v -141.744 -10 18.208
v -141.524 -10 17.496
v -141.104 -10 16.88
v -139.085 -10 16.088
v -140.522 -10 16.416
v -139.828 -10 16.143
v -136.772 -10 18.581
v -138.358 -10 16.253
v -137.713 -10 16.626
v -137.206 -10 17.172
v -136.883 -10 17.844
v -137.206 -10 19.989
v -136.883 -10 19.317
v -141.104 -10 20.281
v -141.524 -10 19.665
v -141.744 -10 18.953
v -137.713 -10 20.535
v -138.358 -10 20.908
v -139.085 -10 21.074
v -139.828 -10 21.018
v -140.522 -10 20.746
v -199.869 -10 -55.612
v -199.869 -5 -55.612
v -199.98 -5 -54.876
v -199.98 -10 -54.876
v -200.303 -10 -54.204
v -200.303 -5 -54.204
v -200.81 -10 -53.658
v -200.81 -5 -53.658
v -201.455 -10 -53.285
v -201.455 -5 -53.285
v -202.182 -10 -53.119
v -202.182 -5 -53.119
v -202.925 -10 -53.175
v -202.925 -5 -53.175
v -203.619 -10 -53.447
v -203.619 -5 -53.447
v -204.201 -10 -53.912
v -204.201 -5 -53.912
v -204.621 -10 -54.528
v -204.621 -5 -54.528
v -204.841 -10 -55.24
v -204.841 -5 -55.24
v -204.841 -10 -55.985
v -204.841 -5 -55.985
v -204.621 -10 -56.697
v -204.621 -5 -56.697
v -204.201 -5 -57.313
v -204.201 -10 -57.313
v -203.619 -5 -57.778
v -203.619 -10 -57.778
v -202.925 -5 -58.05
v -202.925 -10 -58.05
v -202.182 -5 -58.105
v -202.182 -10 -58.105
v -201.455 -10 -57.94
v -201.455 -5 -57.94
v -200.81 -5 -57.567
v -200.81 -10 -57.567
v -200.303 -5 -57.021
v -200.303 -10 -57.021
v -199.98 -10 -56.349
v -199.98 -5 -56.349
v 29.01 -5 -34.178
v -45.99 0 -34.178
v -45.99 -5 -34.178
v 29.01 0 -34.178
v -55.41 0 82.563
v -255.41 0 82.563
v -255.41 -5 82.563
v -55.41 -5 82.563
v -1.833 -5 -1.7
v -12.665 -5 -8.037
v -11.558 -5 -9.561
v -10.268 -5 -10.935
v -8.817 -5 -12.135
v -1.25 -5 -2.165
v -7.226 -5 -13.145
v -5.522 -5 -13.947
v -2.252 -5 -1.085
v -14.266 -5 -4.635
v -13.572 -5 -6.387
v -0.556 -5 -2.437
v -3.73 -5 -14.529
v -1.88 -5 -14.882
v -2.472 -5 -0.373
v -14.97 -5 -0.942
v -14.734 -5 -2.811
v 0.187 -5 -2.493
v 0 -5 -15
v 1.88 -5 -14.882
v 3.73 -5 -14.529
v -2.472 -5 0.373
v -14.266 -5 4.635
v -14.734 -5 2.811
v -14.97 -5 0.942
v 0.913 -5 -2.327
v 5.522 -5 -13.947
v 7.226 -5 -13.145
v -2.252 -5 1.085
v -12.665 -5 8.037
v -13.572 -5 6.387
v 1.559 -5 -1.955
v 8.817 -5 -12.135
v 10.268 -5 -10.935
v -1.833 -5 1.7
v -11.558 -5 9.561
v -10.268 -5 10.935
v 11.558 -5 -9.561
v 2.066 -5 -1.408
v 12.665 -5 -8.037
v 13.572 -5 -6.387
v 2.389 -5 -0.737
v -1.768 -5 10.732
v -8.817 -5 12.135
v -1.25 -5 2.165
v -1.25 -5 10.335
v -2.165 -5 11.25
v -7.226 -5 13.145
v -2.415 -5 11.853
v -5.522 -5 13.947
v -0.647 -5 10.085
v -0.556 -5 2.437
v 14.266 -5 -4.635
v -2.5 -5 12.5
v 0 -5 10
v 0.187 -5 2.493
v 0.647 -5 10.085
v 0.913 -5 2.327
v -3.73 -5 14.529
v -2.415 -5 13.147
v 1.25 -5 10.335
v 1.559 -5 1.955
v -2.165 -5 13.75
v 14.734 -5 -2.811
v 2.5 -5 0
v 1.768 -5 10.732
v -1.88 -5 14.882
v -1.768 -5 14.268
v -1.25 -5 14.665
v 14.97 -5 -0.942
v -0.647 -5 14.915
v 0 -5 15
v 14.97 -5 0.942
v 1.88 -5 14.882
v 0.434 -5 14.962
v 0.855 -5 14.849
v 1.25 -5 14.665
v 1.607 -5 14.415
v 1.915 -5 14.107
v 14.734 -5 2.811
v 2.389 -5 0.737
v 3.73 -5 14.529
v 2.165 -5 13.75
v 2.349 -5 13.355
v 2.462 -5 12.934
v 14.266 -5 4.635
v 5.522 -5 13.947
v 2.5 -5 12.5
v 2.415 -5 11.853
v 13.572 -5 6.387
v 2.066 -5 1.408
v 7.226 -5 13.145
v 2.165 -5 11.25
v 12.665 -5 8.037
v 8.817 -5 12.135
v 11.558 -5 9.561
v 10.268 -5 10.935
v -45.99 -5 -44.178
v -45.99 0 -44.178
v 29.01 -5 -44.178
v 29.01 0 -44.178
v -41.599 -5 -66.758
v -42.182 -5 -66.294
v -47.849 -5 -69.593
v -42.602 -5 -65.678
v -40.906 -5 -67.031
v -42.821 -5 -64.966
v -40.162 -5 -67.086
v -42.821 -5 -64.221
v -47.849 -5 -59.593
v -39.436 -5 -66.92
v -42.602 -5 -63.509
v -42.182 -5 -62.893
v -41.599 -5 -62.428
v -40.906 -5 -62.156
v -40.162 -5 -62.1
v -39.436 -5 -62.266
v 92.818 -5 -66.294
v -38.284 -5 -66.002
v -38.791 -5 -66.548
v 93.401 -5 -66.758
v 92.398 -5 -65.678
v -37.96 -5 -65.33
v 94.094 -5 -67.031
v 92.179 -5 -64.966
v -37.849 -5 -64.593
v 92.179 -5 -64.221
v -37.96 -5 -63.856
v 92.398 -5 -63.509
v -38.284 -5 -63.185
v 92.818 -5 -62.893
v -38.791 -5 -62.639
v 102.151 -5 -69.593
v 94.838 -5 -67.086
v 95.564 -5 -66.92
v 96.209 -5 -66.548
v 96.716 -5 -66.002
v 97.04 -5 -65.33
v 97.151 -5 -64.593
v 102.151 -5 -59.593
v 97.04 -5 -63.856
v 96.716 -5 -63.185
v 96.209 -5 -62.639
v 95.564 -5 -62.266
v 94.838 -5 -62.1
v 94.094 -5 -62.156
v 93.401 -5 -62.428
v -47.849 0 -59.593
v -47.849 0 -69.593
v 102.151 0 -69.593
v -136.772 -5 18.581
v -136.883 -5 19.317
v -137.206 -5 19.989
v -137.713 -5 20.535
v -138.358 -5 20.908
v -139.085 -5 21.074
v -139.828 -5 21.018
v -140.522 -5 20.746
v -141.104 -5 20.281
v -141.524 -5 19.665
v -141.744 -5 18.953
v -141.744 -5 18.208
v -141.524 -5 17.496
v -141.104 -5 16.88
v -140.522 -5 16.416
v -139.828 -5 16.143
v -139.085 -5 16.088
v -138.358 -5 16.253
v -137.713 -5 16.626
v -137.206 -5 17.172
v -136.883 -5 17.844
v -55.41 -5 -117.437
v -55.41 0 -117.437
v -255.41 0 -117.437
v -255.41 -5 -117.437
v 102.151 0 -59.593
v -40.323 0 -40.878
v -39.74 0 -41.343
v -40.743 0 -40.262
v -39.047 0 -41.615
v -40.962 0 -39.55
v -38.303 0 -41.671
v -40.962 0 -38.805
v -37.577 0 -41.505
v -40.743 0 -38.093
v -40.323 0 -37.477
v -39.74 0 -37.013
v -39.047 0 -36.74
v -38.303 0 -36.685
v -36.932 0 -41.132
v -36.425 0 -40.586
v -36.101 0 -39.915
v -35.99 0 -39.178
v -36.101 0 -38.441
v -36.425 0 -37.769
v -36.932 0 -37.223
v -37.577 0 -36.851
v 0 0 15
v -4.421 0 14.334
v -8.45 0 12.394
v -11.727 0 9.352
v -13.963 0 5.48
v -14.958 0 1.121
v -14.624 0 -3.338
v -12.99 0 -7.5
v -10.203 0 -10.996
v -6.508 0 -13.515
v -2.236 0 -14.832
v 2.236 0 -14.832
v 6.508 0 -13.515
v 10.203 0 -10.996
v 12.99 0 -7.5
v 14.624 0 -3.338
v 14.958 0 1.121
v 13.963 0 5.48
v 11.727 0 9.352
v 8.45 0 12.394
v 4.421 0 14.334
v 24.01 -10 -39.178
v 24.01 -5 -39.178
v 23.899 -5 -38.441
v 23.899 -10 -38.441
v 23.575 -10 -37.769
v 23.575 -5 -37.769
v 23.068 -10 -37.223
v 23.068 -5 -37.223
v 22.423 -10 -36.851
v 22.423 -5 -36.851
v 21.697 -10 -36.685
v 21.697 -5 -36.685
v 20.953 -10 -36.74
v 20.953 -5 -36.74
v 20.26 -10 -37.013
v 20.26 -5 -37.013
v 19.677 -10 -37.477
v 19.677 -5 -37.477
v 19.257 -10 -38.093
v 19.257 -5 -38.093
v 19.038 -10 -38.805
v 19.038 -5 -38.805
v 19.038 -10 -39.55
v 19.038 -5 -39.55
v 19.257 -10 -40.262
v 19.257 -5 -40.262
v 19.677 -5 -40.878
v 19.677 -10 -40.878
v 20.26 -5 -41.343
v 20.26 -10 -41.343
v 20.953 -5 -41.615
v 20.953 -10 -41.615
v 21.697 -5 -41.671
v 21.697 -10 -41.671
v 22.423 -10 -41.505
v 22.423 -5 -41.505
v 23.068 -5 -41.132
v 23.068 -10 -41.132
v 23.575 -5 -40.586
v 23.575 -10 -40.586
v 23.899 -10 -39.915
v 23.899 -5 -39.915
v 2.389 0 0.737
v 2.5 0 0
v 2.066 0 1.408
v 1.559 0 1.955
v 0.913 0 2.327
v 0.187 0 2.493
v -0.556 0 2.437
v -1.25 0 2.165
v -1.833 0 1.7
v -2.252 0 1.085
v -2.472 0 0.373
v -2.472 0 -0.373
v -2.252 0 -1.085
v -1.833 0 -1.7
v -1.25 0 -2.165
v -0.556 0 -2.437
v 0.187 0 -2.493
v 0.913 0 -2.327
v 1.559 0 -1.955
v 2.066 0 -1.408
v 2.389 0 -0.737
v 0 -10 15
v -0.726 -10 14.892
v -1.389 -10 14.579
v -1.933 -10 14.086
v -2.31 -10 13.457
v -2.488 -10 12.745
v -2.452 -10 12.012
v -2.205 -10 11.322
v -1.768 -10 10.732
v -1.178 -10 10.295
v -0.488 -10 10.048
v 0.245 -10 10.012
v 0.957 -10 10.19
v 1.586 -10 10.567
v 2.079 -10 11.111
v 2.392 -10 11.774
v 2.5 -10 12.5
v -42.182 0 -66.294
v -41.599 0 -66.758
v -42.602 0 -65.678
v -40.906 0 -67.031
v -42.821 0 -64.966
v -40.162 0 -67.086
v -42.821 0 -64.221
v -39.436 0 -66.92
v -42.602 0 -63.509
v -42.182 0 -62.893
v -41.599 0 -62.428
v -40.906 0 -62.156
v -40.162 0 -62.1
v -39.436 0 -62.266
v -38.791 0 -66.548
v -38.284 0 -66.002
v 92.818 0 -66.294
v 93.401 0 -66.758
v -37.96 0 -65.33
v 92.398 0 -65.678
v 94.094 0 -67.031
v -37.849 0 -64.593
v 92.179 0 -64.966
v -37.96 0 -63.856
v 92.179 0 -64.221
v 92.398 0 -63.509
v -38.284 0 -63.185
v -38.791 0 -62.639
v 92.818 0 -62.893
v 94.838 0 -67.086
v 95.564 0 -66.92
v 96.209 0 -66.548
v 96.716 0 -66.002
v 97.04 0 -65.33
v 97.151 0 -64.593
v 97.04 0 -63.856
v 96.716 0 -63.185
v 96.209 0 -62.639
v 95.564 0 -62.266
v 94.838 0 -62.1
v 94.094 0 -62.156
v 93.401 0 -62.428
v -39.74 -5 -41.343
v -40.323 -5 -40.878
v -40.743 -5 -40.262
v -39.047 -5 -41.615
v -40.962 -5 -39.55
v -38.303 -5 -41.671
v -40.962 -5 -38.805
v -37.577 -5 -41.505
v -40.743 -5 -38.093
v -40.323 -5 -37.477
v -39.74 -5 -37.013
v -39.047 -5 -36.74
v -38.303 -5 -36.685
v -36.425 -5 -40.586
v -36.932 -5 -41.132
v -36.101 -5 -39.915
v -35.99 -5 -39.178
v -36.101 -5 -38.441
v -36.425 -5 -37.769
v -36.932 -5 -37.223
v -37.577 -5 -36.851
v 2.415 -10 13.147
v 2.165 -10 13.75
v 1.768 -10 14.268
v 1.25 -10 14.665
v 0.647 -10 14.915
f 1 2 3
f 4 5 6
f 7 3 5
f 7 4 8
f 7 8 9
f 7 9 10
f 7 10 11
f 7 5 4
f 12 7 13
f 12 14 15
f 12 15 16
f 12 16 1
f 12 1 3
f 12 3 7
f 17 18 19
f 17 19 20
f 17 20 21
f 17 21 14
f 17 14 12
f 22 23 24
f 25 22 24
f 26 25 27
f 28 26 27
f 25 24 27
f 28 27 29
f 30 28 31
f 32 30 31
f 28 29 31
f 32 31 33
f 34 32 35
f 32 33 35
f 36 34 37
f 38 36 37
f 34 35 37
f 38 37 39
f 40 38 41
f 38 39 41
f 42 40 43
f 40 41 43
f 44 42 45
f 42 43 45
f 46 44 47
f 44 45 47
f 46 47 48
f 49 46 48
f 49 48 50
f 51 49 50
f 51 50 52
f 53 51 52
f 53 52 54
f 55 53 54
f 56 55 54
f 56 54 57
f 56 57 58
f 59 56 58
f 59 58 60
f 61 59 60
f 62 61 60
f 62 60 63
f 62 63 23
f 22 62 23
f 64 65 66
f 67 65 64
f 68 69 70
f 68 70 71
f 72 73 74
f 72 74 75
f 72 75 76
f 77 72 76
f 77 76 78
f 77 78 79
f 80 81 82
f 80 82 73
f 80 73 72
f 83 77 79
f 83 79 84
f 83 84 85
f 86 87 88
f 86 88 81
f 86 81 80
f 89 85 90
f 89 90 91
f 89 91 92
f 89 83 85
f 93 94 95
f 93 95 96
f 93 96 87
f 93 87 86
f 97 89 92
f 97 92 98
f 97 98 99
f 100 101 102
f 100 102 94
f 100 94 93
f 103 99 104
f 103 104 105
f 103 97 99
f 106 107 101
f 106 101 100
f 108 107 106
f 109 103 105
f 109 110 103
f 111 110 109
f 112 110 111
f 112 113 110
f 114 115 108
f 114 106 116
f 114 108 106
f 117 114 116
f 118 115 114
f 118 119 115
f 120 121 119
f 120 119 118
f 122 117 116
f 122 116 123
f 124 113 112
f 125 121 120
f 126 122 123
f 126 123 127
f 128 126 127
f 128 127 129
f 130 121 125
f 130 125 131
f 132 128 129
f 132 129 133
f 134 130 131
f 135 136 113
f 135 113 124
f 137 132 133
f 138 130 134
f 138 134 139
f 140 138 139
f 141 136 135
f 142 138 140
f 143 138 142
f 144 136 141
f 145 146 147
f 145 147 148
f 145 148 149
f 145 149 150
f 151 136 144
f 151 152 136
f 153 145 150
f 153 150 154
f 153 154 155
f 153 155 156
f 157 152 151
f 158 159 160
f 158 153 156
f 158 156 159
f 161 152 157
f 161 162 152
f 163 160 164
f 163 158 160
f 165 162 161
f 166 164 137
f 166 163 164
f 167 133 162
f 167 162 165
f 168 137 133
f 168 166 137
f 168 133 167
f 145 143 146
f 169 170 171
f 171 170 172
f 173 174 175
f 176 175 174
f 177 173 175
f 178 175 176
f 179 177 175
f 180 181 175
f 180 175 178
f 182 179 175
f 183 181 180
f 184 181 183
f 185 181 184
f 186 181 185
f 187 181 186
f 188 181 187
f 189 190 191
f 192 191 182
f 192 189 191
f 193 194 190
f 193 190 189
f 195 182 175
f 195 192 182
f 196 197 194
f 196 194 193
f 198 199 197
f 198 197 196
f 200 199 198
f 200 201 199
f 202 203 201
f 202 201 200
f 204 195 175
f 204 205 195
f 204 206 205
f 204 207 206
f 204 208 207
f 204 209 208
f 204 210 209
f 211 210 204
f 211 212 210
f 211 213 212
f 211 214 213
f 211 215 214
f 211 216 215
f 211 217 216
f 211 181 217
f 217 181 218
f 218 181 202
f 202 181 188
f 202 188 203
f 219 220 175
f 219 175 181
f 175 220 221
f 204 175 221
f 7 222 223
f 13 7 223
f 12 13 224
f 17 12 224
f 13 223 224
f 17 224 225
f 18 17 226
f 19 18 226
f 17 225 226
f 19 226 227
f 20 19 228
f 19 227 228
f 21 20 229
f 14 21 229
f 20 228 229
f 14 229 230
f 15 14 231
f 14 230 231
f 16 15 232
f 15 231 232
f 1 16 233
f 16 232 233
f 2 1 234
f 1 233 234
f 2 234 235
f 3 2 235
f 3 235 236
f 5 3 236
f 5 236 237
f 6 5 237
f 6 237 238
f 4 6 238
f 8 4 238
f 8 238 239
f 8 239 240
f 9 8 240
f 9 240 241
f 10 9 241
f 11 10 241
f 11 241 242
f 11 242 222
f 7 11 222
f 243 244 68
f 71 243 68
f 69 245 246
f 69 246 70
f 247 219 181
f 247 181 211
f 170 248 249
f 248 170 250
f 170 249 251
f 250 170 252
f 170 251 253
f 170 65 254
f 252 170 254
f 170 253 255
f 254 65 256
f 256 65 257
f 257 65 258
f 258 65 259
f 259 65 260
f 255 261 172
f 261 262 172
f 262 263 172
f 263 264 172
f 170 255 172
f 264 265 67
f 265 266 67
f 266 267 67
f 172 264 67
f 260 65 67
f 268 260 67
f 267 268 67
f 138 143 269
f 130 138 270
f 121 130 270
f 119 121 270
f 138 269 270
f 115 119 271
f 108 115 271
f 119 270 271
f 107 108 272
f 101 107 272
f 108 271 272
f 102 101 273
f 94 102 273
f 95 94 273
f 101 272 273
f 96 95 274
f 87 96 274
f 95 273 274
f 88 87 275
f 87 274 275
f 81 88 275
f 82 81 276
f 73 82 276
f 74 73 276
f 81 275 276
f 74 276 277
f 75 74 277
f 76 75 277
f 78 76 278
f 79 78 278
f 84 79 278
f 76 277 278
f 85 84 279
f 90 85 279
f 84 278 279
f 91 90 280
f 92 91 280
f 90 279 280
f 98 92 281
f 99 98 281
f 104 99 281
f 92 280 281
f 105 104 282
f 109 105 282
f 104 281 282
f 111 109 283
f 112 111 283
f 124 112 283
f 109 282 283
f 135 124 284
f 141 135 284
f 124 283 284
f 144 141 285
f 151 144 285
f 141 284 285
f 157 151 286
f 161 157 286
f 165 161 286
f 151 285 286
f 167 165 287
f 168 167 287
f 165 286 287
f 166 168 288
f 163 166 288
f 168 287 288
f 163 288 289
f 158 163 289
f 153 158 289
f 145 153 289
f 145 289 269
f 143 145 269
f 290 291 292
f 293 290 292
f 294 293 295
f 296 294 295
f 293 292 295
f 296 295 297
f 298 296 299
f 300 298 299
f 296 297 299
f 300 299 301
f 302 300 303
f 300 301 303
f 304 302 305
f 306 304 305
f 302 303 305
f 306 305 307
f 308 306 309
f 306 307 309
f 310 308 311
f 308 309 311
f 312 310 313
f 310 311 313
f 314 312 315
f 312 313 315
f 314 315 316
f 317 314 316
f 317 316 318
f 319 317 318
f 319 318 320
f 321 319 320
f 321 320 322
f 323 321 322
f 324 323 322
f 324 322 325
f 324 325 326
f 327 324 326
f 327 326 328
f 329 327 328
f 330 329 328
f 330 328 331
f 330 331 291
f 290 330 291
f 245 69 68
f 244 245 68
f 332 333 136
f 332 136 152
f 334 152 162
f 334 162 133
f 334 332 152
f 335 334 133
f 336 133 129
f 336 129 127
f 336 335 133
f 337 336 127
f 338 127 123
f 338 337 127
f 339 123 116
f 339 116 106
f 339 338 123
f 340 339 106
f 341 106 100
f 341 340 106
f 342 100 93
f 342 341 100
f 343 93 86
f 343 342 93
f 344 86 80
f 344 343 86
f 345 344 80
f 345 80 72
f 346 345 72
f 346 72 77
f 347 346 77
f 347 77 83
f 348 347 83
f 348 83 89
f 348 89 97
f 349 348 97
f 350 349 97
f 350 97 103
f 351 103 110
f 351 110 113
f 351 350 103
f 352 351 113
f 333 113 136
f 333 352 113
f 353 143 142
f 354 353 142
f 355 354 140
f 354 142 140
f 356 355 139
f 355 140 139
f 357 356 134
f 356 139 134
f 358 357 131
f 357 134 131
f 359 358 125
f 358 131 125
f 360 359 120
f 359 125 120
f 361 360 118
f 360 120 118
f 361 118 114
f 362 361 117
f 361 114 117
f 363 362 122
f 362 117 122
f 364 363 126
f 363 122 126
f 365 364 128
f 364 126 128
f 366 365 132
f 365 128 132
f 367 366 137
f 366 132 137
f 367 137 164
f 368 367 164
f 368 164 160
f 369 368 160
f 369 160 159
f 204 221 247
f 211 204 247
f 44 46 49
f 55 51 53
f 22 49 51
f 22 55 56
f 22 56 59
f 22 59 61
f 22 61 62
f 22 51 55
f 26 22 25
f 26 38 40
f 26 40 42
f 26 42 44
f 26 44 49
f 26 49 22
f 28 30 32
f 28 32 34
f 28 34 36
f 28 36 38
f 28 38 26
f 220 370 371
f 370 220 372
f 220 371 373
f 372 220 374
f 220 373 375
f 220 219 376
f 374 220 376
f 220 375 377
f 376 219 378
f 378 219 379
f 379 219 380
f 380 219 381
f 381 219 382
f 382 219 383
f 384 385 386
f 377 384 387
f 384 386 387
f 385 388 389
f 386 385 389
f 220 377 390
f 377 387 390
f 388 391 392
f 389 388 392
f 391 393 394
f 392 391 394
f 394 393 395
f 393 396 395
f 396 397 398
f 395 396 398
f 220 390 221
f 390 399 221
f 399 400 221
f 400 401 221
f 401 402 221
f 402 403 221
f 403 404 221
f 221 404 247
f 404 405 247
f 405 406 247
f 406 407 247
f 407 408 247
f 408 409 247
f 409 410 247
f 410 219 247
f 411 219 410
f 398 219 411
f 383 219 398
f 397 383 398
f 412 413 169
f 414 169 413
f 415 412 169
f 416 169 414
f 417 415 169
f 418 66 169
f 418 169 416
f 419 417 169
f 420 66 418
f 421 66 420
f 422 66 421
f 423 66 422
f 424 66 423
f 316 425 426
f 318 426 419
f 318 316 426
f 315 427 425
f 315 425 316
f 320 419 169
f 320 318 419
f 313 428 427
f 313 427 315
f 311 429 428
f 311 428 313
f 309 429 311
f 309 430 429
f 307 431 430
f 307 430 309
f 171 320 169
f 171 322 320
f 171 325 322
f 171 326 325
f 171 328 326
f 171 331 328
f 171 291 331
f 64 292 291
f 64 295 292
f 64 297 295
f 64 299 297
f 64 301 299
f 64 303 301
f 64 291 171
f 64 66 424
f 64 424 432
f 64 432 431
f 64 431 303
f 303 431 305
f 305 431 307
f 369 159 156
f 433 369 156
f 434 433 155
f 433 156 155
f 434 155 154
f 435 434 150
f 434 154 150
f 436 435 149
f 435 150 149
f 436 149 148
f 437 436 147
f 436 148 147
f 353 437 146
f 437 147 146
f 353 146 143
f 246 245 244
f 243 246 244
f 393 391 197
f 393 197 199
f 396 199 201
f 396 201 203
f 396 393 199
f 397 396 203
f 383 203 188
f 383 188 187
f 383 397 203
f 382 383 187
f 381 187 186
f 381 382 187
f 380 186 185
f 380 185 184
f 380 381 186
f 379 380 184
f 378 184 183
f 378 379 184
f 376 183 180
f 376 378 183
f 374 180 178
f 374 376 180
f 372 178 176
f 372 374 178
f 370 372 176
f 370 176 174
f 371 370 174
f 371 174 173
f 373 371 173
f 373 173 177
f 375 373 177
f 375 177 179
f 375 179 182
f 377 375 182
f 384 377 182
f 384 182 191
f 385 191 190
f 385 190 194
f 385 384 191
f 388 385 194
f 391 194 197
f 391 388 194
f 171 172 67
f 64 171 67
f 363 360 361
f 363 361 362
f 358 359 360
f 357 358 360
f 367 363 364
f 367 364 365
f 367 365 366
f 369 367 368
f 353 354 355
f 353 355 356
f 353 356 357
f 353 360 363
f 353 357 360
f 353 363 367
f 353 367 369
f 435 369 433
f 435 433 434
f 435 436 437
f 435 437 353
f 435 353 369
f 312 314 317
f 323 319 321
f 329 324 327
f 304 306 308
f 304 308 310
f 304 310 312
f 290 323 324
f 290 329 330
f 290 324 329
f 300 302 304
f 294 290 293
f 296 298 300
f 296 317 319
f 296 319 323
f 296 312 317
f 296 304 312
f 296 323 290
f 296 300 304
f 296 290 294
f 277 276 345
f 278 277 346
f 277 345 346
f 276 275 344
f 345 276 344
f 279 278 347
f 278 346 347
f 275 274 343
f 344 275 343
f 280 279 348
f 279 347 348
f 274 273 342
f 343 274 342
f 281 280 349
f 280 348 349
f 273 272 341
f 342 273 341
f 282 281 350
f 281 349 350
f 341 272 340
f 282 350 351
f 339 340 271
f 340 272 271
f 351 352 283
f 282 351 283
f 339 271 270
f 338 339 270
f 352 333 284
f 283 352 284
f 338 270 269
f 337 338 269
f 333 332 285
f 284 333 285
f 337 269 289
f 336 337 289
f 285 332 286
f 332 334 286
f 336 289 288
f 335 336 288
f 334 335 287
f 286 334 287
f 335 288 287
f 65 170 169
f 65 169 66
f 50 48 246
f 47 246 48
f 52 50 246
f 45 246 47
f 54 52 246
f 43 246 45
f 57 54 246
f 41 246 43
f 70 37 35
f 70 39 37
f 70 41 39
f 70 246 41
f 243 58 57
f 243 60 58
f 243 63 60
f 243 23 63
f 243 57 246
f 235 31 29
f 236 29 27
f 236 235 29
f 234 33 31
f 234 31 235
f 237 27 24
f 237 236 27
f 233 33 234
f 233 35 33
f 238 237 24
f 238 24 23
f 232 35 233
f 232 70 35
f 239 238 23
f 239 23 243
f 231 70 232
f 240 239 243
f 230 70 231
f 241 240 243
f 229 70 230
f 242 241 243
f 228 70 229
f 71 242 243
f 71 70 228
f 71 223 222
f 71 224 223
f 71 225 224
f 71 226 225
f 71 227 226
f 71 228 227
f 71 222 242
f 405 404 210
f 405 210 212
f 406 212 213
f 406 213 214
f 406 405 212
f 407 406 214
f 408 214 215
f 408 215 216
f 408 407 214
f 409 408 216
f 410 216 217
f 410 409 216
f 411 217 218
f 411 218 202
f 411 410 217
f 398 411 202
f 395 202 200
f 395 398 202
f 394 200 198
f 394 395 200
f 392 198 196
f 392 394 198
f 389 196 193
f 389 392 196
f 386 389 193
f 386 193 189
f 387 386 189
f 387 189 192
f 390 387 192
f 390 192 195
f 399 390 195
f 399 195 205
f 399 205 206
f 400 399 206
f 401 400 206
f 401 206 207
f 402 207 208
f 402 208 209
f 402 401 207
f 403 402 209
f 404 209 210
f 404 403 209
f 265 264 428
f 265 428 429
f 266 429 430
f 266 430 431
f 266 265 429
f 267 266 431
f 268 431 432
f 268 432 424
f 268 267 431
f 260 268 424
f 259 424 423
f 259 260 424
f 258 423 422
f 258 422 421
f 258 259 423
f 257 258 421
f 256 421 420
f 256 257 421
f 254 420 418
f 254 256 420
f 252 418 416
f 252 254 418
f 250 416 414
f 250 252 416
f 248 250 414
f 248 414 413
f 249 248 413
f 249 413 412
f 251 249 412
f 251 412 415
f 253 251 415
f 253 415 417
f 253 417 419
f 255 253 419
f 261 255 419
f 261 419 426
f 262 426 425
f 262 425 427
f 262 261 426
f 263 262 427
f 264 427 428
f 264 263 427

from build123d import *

# Parameters (mm, degrees)
F0_R     = 2.5
F2_DEPTH = 5
F0_W     = 75
F0_H     = 10
F0_W_2   = 150
F1_W     = 200
F1_H     = 200
F1_R     = 2.5
F3_DEPTH = 5
F4_DEPTH = 10
F5_DEPTH = 10
F6_DEPTH = 10
F7_DEPTH = 10


with BuildPart() as f2:
    # F0 (on Front) → F2 (new body)
    with BuildSketch(Plane.XZ):
        with BuildLine():
            ThreePointArc((0, 15), (-10.6066017178, -10.6066017178), (15, 0))
            ThreePointArc((15, 0), (10.6066017178, 10.6066017178), (0, 15))
        make_face()
        Circle(F0_R, mode=Mode.SUBTRACT)
        with BuildLine():
            ThreePointArc((2.5, 12.5), (-1.767766953, 10.732233047), (0, 15))
            ThreePointArc((0, 15), (1.767766953, 14.267766953), (2.5, 12.5))
        make_face(mode=Mode.SUBTRACT)
        with BuildLine():
            ThreePointArc((2.5, 12.5), (1.767766953, 14.267766953), (0, 15))
            ThreePointArc((0, 15), (-1.767766953, 10.732233047), (2.5, 12.5))
        make_face()
    extrude(amount=F2_DEPTH)

    # F0 (on Front) → F5 (join)
    with BuildSketch(Plane.XZ):
        with BuildLine():
            ThreePointArc((2.5, 12.5), (1.767766953, 14.267766953), (0, 15))
            ThreePointArc((0, 15), (-1.767766953, 10.732233047), (2.5, 12.5))
        make_face()
    extrude(amount=F5_DEPTH)


with BuildPart() as f2b:
    # F0 (on Front) → F2, piece 2 (new body)
    with BuildSketch(Plane.XZ):
        with Locations((-8.4902770817, -39.1776886582)):
            Rectangle(F0_W, F0_H)
        with Locations((-38.4902770817, -39.1776886582)):
            Circle(F0_R, mode=Mode.SUBTRACT)
        with Locations((21.5097229183, -39.1776886582)):
            Circle(F0_R, mode=Mode.SUBTRACT)
    extrude(amount=F2_DEPTH)

    # F0 (on Front) → F6 (join)
    with BuildSketch(Plane.XZ):
        with Locations((21.5097229183, -39.1776886582)):
            Circle(F0_R)
    extrude(amount=F6_DEPTH)


with BuildPart() as f2c:
    # F0 (on Front) → F2, piece 3 (new body)
    with BuildSketch(Plane.XZ):
        with Locations((27.1506987512, -64.5932731032)):
            Rectangle(F0_W_2, F0_H)
        with Locations((-40.3493012488, -64.5932731032)):
            Circle(F0_R, mode=Mode.SUBTRACT)
        with Locations((94.6506987512, -64.5932731032)):
            Circle(F0_R, mode=Mode.SUBTRACT)
    extrude(amount=F2_DEPTH)


with BuildPart() as f3:
    # F1 (on Front) → F3 (new body)
    with BuildSketch(Plane.XZ):
        with Locations((-155.4097570479, -17.4372267429)):
            Rectangle(F1_W, F1_H)
        with Locations((-202.3687064648, -55.6124635041)):
            Circle(F1_R, mode=Mode.SUBTRACT)
        with Locations((-139.2716020346, 18.5805745423)):
            Circle(F1_R, mode=Mode.SUBTRACT)
    extrude(amount=F3_DEPTH)

    # F1 (on Front) → F4 (join)
    with BuildSketch(Plane.XZ):
        with Locations((-202.3687064648, -55.6124635041)):
            Circle(F1_R)
    extrude(amount=F4_DEPTH)

    # F1 (on Front) → F7 (join)
    with BuildSketch(Plane.XZ):
        with Locations((-139.2716020346, 18.5805745423)):
            Circle(F1_R)
    extrude(amount=F7_DEPTH)


solid = Compound([f2.part, f2b.part, f2c.part, f3.part])
